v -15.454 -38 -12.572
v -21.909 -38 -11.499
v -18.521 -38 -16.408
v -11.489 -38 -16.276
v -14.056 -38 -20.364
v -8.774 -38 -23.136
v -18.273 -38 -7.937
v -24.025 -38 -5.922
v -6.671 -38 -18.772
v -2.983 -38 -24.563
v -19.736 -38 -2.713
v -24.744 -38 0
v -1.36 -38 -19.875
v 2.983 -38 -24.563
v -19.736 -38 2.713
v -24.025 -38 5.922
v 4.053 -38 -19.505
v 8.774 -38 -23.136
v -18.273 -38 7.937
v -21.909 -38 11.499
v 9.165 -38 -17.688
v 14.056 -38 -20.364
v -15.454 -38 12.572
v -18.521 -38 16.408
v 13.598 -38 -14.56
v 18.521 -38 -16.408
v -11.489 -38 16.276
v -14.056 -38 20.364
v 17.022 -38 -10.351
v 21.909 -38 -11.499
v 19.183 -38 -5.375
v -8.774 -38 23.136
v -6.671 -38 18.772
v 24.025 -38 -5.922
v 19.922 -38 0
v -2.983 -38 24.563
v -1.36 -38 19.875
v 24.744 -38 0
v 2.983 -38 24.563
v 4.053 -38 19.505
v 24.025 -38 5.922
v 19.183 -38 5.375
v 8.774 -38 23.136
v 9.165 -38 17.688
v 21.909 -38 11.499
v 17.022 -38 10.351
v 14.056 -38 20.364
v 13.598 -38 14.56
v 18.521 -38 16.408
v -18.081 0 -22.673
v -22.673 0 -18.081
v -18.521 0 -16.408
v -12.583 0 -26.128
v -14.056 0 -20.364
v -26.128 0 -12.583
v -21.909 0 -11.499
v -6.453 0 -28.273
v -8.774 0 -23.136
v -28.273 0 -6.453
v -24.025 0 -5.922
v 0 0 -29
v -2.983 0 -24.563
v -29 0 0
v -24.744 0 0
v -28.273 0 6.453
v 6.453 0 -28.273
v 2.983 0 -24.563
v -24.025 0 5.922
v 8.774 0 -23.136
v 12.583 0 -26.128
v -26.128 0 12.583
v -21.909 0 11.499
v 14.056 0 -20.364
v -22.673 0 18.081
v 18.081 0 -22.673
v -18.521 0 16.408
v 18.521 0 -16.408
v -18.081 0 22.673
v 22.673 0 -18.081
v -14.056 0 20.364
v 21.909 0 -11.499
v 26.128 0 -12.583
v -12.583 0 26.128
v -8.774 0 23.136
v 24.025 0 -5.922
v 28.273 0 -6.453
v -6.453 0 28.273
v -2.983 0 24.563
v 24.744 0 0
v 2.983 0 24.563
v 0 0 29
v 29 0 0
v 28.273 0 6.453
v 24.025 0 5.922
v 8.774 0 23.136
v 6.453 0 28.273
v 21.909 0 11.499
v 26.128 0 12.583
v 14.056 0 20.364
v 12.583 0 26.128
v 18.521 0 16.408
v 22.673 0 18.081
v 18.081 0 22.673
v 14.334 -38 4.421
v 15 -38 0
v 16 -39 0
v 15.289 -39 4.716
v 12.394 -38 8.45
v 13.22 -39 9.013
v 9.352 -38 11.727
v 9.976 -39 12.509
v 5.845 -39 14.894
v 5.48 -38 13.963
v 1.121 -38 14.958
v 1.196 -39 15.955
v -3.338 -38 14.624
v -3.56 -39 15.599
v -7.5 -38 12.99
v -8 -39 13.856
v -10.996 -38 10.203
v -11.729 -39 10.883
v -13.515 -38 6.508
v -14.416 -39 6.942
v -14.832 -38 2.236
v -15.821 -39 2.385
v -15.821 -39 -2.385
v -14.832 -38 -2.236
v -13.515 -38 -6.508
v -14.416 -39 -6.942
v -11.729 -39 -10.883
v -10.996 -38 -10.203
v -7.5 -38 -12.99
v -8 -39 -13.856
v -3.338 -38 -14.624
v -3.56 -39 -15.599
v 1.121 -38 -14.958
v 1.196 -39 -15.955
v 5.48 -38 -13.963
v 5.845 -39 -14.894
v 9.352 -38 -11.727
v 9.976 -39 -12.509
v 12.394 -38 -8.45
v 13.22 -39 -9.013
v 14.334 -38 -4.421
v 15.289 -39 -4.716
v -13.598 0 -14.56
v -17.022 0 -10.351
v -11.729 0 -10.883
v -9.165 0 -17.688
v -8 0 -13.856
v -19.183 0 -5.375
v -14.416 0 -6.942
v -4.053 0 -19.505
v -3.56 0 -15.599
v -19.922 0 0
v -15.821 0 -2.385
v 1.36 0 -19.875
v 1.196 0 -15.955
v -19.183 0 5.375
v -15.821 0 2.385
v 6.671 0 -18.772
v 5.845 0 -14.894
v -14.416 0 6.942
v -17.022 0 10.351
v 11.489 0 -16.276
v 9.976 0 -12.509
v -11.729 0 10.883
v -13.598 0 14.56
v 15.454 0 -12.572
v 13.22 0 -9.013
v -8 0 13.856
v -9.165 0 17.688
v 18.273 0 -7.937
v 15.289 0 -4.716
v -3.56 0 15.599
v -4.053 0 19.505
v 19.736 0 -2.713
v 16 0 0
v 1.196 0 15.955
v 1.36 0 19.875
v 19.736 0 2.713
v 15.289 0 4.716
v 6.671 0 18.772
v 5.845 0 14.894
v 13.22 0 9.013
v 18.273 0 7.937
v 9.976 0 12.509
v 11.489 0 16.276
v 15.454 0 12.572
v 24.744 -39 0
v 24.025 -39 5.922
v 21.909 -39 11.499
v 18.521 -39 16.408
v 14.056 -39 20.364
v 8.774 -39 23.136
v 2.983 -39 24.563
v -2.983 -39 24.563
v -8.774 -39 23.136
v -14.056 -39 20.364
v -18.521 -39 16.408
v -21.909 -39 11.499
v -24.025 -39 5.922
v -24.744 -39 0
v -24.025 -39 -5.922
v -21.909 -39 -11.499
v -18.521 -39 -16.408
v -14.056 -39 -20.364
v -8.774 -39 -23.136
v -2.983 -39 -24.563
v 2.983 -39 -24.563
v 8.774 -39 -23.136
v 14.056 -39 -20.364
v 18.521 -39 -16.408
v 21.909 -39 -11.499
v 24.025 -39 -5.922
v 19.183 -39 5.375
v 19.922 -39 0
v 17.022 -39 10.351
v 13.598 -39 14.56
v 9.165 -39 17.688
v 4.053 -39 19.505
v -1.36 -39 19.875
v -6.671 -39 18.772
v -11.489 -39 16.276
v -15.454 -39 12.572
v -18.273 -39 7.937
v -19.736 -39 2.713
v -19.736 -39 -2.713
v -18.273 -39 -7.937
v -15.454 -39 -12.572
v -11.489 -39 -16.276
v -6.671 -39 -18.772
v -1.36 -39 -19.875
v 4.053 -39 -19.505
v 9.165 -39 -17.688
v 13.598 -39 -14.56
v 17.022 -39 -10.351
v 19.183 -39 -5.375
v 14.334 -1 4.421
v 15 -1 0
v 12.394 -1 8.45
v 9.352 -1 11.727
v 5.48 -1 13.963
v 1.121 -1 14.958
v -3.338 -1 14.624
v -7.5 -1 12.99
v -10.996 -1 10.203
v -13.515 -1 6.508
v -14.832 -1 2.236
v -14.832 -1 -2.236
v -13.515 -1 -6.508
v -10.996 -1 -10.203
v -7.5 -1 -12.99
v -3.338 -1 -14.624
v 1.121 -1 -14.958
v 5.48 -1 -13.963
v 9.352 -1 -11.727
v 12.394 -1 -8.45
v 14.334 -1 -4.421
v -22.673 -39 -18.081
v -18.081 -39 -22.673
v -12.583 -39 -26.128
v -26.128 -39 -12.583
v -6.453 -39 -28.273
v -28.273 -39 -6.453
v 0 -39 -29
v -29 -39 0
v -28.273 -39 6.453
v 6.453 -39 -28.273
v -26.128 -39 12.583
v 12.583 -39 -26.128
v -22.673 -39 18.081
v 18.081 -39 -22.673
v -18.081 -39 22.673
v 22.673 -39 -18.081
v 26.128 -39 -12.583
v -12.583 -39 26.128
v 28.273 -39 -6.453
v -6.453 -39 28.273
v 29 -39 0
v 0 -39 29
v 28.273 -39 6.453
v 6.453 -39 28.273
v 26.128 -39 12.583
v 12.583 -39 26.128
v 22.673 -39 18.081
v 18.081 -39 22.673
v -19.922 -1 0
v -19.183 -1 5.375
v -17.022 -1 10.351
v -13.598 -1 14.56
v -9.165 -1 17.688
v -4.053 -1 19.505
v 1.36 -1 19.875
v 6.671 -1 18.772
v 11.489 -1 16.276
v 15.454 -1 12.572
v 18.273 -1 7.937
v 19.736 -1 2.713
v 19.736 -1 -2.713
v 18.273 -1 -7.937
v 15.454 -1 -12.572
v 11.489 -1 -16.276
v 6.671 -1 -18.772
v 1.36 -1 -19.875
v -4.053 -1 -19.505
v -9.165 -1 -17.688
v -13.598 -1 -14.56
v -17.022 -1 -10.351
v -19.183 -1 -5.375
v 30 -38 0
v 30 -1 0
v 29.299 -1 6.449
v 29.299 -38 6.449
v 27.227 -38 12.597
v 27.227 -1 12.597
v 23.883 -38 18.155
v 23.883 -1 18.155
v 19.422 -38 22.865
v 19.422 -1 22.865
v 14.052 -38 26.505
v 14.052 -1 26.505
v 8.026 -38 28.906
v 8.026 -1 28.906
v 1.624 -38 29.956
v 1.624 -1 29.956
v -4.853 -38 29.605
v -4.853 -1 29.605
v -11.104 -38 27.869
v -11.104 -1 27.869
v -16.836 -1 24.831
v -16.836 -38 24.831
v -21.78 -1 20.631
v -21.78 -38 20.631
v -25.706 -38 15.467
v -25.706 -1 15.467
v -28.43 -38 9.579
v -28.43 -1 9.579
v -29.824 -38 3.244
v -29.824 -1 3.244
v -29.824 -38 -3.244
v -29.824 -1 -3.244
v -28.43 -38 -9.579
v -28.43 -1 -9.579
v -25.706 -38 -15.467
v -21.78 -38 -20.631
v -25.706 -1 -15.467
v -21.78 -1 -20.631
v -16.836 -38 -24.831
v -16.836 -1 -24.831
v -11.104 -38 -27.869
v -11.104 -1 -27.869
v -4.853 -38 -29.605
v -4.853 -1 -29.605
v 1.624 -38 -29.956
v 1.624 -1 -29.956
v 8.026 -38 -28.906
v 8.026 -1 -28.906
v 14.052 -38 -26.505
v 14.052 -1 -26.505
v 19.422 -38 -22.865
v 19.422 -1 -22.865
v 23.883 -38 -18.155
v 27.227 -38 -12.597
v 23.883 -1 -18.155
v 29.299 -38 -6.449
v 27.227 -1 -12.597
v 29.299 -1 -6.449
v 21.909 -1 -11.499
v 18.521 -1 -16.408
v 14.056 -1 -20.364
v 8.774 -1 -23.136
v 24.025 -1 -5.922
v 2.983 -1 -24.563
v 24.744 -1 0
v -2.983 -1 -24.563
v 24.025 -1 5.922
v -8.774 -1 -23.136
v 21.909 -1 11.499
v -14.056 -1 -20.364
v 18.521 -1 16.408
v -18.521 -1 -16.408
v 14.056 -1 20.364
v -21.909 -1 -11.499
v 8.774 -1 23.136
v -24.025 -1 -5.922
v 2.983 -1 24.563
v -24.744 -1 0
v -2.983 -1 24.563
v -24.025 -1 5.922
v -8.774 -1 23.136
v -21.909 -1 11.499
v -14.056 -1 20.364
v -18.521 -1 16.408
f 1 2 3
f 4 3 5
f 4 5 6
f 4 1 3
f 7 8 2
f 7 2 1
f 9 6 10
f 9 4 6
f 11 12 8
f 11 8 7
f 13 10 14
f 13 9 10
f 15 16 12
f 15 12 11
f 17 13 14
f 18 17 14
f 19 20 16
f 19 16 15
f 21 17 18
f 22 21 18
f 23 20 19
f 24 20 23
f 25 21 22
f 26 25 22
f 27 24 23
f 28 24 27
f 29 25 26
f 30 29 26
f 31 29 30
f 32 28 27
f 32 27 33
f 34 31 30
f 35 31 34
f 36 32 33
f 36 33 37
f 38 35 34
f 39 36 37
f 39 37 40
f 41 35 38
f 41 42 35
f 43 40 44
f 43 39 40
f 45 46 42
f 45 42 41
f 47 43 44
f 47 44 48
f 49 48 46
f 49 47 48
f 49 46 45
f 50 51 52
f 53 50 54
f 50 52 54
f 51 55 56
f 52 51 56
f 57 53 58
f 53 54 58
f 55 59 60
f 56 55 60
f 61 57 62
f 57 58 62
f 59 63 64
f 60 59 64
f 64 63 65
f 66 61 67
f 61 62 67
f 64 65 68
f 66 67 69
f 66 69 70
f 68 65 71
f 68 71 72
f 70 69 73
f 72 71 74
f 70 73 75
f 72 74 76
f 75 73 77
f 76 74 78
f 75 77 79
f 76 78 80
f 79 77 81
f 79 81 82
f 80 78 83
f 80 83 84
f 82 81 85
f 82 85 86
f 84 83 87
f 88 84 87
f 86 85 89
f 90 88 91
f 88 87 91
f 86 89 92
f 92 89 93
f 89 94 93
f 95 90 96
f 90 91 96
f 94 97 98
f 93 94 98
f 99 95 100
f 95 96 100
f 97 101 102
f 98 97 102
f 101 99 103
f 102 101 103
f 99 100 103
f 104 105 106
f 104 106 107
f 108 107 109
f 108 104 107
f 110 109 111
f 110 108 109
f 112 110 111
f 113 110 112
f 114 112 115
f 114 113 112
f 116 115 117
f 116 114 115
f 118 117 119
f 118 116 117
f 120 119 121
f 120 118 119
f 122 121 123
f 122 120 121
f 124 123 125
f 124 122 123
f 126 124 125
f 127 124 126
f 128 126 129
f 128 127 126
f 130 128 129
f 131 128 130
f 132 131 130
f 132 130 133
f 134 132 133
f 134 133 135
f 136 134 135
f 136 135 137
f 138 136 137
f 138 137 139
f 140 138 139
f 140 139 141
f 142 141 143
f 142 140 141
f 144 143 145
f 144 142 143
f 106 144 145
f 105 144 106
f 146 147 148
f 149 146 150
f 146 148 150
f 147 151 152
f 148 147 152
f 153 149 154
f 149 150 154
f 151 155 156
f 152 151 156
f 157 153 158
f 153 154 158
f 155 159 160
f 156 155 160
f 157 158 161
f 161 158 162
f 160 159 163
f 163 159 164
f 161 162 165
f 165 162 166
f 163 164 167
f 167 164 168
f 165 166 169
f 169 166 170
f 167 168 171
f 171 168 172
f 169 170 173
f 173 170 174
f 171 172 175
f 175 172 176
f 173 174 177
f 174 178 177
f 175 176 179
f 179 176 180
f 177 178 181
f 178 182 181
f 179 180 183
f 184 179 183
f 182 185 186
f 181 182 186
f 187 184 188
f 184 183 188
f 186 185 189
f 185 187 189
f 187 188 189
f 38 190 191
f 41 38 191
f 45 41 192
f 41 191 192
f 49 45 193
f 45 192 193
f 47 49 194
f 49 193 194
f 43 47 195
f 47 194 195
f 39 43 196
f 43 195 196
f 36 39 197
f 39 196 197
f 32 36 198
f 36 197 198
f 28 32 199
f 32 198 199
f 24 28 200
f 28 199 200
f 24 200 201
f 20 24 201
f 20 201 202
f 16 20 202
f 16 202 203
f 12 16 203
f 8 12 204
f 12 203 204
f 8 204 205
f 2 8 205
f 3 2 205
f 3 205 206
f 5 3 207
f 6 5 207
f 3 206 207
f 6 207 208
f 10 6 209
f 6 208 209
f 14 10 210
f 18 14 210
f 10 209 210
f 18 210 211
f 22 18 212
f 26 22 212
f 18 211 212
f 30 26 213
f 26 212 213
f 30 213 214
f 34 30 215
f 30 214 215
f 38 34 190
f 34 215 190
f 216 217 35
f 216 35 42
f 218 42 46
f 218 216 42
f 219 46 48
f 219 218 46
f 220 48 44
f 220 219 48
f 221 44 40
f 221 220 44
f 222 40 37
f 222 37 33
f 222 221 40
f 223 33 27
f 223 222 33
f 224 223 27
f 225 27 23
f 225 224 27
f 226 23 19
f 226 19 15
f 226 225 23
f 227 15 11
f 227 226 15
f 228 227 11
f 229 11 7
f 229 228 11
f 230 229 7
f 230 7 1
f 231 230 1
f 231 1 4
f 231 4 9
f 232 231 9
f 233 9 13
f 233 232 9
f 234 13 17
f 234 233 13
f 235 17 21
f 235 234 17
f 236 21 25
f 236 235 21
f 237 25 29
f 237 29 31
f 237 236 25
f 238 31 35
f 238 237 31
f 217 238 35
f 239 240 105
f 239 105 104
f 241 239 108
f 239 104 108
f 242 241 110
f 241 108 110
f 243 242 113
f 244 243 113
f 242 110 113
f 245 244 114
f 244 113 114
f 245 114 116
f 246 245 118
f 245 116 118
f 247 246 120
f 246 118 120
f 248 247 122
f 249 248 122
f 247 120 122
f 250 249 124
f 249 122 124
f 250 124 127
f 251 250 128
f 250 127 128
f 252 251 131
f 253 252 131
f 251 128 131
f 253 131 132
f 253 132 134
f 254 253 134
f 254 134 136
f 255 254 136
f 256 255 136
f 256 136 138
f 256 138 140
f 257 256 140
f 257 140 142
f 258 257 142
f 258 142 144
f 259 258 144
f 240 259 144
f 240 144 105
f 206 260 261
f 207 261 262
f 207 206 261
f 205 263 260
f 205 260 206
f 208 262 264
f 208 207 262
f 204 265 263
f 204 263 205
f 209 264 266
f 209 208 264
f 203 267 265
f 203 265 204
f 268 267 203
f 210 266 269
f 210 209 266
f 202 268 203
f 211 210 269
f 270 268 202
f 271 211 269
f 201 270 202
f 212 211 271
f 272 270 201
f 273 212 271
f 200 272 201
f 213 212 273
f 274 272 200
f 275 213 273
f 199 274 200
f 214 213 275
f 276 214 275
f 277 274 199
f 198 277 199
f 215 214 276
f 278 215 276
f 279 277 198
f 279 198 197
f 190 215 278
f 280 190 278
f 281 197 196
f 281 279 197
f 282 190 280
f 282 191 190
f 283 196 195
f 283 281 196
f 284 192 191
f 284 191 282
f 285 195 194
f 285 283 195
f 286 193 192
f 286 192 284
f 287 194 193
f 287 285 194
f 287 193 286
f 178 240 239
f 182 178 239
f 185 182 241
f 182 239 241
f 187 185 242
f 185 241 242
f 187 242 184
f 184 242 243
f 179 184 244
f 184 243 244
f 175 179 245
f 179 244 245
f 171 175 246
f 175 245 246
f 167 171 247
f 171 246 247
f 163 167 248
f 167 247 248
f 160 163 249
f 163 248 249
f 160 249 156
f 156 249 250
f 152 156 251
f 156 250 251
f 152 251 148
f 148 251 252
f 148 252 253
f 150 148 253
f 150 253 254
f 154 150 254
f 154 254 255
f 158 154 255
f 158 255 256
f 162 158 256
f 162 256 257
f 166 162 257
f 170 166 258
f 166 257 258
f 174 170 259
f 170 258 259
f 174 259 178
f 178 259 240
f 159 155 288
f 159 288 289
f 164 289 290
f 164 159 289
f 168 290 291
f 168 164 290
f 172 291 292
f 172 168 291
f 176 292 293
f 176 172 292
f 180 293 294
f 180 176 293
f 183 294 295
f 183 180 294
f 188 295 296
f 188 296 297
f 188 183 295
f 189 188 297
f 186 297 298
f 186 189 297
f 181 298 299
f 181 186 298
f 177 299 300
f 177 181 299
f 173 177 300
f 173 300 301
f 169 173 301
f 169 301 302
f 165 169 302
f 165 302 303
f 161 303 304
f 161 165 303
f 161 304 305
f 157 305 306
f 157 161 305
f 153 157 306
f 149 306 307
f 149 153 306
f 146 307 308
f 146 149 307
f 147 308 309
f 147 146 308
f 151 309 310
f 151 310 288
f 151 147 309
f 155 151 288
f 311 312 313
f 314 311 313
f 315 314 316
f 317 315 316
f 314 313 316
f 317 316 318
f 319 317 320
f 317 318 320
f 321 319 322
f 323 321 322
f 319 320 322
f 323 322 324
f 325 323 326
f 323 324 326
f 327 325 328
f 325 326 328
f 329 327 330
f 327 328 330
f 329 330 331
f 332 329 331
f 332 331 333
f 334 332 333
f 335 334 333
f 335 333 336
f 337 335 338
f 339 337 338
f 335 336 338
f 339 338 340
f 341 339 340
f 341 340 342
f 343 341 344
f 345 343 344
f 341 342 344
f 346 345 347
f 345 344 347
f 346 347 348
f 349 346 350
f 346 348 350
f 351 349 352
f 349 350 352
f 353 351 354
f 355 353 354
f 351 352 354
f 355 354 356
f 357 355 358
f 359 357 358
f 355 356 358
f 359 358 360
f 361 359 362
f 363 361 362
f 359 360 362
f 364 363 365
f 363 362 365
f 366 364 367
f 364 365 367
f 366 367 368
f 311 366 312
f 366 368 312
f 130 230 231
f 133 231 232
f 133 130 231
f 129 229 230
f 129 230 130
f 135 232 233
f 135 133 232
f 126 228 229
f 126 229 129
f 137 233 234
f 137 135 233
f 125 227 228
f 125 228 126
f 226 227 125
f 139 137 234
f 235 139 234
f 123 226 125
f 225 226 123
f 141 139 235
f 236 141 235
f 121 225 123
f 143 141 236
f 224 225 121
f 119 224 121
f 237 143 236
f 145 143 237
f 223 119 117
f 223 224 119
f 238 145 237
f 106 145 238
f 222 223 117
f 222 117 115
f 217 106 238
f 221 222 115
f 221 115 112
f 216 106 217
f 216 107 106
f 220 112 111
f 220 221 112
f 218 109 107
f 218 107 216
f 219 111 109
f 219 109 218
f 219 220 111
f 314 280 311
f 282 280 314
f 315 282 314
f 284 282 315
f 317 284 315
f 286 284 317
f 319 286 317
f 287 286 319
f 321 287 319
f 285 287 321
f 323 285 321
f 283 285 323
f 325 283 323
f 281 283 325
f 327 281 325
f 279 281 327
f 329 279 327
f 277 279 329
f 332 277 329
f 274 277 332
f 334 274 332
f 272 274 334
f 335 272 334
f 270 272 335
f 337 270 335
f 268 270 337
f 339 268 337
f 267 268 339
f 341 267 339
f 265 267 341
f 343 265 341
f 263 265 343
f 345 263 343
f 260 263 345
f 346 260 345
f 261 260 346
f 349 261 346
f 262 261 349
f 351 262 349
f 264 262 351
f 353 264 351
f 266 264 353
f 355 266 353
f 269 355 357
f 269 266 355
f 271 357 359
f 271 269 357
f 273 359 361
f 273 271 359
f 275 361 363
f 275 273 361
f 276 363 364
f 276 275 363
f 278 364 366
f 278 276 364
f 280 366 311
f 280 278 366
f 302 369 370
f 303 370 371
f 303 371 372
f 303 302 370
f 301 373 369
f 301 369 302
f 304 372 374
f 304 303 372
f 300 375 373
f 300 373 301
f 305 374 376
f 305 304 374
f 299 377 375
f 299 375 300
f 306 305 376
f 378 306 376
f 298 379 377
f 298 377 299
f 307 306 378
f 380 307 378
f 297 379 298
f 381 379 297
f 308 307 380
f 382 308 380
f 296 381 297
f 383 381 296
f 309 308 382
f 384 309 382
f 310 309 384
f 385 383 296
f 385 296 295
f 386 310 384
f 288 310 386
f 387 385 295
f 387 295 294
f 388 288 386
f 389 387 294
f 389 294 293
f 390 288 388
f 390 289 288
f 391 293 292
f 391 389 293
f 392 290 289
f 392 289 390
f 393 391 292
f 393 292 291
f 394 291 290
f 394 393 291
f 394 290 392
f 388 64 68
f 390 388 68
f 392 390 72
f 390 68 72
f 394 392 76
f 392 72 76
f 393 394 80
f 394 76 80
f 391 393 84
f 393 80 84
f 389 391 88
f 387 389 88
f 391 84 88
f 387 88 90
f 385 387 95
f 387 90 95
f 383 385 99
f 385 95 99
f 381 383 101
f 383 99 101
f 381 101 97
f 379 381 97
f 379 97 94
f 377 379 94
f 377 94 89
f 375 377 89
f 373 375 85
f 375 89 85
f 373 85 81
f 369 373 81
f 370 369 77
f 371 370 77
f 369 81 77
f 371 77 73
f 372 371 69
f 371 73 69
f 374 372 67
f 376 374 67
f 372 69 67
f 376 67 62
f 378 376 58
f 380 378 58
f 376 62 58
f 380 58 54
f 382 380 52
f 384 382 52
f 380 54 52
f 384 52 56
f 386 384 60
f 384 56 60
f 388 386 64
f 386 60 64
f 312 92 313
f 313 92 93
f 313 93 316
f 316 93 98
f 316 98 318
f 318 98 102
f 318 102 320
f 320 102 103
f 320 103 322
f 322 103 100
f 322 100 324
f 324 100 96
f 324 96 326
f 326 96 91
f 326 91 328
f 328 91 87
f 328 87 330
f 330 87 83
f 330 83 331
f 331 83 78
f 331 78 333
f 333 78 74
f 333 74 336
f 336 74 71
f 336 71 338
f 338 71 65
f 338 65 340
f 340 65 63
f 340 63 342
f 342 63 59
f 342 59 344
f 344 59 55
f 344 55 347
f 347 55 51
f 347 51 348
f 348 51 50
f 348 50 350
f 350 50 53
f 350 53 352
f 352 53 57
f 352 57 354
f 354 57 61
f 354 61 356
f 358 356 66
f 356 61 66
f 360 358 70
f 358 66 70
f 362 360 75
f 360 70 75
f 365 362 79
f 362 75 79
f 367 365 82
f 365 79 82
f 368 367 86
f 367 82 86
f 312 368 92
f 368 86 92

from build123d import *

# Parameters (mm, degrees)
F0_R     = 30
F1_DEPTH = 39
F2_R     = 15
F3_DEPTH = 39.001
F4_SIZE  = 1
F5_R     = 24.743506
F5_R_2   = 19.921836
F6_DEPTH = 1
F7_R     = 24.743506
F7_R_2   = 19.921836
F8_DEPTH = 1


with BuildPart() as f1:
    # F0 (on Front) → F1 (new body)
    with BuildSketch(Plane.XZ):
        Circle(F0_R)
    extrude(amount=F1_DEPTH)

    # F2 (on face) → F3 (cut, through all)
    with BuildSketch(Plane.XZ.offset(39)):
        Circle(F2_R)
    extrude(amount=-F3_DEPTH, mode=Mode.SUBTRACT)

    # F4
    f4_edges = [f1.edges().sort_by_distance(p)[0] for p in [
        (-30, -39, 0),
        (-15, -39, 0),
        (-30, 0, 0),
        (-15, 0, 0),
    ]]
    chamfer(f4_edges, length=F4_SIZE)

    # F5 (on face) → F6 (cut)
    with BuildSketch(Plane(origin=(0, 0, 0), x_dir=(-1, 0, 0), z_dir=(0, 1, 0))):
        Circle(F5_R)
        Circle(F5_R_2, mode=Mode.SUBTRACT)
    extrude(amount=-F6_DEPTH, mode=Mode.SUBTRACT)

    # F7 (on face) → F8 (cut)
    with BuildSketch(Plane.XZ.offset(39)):
        Circle(F7_R)
        Circle(F7_R_2, mode=Mode.SUBTRACT)
    extrude(amount=-F8_DEPTH, mode=Mode.SUBTRACT)


solid = f1.part
